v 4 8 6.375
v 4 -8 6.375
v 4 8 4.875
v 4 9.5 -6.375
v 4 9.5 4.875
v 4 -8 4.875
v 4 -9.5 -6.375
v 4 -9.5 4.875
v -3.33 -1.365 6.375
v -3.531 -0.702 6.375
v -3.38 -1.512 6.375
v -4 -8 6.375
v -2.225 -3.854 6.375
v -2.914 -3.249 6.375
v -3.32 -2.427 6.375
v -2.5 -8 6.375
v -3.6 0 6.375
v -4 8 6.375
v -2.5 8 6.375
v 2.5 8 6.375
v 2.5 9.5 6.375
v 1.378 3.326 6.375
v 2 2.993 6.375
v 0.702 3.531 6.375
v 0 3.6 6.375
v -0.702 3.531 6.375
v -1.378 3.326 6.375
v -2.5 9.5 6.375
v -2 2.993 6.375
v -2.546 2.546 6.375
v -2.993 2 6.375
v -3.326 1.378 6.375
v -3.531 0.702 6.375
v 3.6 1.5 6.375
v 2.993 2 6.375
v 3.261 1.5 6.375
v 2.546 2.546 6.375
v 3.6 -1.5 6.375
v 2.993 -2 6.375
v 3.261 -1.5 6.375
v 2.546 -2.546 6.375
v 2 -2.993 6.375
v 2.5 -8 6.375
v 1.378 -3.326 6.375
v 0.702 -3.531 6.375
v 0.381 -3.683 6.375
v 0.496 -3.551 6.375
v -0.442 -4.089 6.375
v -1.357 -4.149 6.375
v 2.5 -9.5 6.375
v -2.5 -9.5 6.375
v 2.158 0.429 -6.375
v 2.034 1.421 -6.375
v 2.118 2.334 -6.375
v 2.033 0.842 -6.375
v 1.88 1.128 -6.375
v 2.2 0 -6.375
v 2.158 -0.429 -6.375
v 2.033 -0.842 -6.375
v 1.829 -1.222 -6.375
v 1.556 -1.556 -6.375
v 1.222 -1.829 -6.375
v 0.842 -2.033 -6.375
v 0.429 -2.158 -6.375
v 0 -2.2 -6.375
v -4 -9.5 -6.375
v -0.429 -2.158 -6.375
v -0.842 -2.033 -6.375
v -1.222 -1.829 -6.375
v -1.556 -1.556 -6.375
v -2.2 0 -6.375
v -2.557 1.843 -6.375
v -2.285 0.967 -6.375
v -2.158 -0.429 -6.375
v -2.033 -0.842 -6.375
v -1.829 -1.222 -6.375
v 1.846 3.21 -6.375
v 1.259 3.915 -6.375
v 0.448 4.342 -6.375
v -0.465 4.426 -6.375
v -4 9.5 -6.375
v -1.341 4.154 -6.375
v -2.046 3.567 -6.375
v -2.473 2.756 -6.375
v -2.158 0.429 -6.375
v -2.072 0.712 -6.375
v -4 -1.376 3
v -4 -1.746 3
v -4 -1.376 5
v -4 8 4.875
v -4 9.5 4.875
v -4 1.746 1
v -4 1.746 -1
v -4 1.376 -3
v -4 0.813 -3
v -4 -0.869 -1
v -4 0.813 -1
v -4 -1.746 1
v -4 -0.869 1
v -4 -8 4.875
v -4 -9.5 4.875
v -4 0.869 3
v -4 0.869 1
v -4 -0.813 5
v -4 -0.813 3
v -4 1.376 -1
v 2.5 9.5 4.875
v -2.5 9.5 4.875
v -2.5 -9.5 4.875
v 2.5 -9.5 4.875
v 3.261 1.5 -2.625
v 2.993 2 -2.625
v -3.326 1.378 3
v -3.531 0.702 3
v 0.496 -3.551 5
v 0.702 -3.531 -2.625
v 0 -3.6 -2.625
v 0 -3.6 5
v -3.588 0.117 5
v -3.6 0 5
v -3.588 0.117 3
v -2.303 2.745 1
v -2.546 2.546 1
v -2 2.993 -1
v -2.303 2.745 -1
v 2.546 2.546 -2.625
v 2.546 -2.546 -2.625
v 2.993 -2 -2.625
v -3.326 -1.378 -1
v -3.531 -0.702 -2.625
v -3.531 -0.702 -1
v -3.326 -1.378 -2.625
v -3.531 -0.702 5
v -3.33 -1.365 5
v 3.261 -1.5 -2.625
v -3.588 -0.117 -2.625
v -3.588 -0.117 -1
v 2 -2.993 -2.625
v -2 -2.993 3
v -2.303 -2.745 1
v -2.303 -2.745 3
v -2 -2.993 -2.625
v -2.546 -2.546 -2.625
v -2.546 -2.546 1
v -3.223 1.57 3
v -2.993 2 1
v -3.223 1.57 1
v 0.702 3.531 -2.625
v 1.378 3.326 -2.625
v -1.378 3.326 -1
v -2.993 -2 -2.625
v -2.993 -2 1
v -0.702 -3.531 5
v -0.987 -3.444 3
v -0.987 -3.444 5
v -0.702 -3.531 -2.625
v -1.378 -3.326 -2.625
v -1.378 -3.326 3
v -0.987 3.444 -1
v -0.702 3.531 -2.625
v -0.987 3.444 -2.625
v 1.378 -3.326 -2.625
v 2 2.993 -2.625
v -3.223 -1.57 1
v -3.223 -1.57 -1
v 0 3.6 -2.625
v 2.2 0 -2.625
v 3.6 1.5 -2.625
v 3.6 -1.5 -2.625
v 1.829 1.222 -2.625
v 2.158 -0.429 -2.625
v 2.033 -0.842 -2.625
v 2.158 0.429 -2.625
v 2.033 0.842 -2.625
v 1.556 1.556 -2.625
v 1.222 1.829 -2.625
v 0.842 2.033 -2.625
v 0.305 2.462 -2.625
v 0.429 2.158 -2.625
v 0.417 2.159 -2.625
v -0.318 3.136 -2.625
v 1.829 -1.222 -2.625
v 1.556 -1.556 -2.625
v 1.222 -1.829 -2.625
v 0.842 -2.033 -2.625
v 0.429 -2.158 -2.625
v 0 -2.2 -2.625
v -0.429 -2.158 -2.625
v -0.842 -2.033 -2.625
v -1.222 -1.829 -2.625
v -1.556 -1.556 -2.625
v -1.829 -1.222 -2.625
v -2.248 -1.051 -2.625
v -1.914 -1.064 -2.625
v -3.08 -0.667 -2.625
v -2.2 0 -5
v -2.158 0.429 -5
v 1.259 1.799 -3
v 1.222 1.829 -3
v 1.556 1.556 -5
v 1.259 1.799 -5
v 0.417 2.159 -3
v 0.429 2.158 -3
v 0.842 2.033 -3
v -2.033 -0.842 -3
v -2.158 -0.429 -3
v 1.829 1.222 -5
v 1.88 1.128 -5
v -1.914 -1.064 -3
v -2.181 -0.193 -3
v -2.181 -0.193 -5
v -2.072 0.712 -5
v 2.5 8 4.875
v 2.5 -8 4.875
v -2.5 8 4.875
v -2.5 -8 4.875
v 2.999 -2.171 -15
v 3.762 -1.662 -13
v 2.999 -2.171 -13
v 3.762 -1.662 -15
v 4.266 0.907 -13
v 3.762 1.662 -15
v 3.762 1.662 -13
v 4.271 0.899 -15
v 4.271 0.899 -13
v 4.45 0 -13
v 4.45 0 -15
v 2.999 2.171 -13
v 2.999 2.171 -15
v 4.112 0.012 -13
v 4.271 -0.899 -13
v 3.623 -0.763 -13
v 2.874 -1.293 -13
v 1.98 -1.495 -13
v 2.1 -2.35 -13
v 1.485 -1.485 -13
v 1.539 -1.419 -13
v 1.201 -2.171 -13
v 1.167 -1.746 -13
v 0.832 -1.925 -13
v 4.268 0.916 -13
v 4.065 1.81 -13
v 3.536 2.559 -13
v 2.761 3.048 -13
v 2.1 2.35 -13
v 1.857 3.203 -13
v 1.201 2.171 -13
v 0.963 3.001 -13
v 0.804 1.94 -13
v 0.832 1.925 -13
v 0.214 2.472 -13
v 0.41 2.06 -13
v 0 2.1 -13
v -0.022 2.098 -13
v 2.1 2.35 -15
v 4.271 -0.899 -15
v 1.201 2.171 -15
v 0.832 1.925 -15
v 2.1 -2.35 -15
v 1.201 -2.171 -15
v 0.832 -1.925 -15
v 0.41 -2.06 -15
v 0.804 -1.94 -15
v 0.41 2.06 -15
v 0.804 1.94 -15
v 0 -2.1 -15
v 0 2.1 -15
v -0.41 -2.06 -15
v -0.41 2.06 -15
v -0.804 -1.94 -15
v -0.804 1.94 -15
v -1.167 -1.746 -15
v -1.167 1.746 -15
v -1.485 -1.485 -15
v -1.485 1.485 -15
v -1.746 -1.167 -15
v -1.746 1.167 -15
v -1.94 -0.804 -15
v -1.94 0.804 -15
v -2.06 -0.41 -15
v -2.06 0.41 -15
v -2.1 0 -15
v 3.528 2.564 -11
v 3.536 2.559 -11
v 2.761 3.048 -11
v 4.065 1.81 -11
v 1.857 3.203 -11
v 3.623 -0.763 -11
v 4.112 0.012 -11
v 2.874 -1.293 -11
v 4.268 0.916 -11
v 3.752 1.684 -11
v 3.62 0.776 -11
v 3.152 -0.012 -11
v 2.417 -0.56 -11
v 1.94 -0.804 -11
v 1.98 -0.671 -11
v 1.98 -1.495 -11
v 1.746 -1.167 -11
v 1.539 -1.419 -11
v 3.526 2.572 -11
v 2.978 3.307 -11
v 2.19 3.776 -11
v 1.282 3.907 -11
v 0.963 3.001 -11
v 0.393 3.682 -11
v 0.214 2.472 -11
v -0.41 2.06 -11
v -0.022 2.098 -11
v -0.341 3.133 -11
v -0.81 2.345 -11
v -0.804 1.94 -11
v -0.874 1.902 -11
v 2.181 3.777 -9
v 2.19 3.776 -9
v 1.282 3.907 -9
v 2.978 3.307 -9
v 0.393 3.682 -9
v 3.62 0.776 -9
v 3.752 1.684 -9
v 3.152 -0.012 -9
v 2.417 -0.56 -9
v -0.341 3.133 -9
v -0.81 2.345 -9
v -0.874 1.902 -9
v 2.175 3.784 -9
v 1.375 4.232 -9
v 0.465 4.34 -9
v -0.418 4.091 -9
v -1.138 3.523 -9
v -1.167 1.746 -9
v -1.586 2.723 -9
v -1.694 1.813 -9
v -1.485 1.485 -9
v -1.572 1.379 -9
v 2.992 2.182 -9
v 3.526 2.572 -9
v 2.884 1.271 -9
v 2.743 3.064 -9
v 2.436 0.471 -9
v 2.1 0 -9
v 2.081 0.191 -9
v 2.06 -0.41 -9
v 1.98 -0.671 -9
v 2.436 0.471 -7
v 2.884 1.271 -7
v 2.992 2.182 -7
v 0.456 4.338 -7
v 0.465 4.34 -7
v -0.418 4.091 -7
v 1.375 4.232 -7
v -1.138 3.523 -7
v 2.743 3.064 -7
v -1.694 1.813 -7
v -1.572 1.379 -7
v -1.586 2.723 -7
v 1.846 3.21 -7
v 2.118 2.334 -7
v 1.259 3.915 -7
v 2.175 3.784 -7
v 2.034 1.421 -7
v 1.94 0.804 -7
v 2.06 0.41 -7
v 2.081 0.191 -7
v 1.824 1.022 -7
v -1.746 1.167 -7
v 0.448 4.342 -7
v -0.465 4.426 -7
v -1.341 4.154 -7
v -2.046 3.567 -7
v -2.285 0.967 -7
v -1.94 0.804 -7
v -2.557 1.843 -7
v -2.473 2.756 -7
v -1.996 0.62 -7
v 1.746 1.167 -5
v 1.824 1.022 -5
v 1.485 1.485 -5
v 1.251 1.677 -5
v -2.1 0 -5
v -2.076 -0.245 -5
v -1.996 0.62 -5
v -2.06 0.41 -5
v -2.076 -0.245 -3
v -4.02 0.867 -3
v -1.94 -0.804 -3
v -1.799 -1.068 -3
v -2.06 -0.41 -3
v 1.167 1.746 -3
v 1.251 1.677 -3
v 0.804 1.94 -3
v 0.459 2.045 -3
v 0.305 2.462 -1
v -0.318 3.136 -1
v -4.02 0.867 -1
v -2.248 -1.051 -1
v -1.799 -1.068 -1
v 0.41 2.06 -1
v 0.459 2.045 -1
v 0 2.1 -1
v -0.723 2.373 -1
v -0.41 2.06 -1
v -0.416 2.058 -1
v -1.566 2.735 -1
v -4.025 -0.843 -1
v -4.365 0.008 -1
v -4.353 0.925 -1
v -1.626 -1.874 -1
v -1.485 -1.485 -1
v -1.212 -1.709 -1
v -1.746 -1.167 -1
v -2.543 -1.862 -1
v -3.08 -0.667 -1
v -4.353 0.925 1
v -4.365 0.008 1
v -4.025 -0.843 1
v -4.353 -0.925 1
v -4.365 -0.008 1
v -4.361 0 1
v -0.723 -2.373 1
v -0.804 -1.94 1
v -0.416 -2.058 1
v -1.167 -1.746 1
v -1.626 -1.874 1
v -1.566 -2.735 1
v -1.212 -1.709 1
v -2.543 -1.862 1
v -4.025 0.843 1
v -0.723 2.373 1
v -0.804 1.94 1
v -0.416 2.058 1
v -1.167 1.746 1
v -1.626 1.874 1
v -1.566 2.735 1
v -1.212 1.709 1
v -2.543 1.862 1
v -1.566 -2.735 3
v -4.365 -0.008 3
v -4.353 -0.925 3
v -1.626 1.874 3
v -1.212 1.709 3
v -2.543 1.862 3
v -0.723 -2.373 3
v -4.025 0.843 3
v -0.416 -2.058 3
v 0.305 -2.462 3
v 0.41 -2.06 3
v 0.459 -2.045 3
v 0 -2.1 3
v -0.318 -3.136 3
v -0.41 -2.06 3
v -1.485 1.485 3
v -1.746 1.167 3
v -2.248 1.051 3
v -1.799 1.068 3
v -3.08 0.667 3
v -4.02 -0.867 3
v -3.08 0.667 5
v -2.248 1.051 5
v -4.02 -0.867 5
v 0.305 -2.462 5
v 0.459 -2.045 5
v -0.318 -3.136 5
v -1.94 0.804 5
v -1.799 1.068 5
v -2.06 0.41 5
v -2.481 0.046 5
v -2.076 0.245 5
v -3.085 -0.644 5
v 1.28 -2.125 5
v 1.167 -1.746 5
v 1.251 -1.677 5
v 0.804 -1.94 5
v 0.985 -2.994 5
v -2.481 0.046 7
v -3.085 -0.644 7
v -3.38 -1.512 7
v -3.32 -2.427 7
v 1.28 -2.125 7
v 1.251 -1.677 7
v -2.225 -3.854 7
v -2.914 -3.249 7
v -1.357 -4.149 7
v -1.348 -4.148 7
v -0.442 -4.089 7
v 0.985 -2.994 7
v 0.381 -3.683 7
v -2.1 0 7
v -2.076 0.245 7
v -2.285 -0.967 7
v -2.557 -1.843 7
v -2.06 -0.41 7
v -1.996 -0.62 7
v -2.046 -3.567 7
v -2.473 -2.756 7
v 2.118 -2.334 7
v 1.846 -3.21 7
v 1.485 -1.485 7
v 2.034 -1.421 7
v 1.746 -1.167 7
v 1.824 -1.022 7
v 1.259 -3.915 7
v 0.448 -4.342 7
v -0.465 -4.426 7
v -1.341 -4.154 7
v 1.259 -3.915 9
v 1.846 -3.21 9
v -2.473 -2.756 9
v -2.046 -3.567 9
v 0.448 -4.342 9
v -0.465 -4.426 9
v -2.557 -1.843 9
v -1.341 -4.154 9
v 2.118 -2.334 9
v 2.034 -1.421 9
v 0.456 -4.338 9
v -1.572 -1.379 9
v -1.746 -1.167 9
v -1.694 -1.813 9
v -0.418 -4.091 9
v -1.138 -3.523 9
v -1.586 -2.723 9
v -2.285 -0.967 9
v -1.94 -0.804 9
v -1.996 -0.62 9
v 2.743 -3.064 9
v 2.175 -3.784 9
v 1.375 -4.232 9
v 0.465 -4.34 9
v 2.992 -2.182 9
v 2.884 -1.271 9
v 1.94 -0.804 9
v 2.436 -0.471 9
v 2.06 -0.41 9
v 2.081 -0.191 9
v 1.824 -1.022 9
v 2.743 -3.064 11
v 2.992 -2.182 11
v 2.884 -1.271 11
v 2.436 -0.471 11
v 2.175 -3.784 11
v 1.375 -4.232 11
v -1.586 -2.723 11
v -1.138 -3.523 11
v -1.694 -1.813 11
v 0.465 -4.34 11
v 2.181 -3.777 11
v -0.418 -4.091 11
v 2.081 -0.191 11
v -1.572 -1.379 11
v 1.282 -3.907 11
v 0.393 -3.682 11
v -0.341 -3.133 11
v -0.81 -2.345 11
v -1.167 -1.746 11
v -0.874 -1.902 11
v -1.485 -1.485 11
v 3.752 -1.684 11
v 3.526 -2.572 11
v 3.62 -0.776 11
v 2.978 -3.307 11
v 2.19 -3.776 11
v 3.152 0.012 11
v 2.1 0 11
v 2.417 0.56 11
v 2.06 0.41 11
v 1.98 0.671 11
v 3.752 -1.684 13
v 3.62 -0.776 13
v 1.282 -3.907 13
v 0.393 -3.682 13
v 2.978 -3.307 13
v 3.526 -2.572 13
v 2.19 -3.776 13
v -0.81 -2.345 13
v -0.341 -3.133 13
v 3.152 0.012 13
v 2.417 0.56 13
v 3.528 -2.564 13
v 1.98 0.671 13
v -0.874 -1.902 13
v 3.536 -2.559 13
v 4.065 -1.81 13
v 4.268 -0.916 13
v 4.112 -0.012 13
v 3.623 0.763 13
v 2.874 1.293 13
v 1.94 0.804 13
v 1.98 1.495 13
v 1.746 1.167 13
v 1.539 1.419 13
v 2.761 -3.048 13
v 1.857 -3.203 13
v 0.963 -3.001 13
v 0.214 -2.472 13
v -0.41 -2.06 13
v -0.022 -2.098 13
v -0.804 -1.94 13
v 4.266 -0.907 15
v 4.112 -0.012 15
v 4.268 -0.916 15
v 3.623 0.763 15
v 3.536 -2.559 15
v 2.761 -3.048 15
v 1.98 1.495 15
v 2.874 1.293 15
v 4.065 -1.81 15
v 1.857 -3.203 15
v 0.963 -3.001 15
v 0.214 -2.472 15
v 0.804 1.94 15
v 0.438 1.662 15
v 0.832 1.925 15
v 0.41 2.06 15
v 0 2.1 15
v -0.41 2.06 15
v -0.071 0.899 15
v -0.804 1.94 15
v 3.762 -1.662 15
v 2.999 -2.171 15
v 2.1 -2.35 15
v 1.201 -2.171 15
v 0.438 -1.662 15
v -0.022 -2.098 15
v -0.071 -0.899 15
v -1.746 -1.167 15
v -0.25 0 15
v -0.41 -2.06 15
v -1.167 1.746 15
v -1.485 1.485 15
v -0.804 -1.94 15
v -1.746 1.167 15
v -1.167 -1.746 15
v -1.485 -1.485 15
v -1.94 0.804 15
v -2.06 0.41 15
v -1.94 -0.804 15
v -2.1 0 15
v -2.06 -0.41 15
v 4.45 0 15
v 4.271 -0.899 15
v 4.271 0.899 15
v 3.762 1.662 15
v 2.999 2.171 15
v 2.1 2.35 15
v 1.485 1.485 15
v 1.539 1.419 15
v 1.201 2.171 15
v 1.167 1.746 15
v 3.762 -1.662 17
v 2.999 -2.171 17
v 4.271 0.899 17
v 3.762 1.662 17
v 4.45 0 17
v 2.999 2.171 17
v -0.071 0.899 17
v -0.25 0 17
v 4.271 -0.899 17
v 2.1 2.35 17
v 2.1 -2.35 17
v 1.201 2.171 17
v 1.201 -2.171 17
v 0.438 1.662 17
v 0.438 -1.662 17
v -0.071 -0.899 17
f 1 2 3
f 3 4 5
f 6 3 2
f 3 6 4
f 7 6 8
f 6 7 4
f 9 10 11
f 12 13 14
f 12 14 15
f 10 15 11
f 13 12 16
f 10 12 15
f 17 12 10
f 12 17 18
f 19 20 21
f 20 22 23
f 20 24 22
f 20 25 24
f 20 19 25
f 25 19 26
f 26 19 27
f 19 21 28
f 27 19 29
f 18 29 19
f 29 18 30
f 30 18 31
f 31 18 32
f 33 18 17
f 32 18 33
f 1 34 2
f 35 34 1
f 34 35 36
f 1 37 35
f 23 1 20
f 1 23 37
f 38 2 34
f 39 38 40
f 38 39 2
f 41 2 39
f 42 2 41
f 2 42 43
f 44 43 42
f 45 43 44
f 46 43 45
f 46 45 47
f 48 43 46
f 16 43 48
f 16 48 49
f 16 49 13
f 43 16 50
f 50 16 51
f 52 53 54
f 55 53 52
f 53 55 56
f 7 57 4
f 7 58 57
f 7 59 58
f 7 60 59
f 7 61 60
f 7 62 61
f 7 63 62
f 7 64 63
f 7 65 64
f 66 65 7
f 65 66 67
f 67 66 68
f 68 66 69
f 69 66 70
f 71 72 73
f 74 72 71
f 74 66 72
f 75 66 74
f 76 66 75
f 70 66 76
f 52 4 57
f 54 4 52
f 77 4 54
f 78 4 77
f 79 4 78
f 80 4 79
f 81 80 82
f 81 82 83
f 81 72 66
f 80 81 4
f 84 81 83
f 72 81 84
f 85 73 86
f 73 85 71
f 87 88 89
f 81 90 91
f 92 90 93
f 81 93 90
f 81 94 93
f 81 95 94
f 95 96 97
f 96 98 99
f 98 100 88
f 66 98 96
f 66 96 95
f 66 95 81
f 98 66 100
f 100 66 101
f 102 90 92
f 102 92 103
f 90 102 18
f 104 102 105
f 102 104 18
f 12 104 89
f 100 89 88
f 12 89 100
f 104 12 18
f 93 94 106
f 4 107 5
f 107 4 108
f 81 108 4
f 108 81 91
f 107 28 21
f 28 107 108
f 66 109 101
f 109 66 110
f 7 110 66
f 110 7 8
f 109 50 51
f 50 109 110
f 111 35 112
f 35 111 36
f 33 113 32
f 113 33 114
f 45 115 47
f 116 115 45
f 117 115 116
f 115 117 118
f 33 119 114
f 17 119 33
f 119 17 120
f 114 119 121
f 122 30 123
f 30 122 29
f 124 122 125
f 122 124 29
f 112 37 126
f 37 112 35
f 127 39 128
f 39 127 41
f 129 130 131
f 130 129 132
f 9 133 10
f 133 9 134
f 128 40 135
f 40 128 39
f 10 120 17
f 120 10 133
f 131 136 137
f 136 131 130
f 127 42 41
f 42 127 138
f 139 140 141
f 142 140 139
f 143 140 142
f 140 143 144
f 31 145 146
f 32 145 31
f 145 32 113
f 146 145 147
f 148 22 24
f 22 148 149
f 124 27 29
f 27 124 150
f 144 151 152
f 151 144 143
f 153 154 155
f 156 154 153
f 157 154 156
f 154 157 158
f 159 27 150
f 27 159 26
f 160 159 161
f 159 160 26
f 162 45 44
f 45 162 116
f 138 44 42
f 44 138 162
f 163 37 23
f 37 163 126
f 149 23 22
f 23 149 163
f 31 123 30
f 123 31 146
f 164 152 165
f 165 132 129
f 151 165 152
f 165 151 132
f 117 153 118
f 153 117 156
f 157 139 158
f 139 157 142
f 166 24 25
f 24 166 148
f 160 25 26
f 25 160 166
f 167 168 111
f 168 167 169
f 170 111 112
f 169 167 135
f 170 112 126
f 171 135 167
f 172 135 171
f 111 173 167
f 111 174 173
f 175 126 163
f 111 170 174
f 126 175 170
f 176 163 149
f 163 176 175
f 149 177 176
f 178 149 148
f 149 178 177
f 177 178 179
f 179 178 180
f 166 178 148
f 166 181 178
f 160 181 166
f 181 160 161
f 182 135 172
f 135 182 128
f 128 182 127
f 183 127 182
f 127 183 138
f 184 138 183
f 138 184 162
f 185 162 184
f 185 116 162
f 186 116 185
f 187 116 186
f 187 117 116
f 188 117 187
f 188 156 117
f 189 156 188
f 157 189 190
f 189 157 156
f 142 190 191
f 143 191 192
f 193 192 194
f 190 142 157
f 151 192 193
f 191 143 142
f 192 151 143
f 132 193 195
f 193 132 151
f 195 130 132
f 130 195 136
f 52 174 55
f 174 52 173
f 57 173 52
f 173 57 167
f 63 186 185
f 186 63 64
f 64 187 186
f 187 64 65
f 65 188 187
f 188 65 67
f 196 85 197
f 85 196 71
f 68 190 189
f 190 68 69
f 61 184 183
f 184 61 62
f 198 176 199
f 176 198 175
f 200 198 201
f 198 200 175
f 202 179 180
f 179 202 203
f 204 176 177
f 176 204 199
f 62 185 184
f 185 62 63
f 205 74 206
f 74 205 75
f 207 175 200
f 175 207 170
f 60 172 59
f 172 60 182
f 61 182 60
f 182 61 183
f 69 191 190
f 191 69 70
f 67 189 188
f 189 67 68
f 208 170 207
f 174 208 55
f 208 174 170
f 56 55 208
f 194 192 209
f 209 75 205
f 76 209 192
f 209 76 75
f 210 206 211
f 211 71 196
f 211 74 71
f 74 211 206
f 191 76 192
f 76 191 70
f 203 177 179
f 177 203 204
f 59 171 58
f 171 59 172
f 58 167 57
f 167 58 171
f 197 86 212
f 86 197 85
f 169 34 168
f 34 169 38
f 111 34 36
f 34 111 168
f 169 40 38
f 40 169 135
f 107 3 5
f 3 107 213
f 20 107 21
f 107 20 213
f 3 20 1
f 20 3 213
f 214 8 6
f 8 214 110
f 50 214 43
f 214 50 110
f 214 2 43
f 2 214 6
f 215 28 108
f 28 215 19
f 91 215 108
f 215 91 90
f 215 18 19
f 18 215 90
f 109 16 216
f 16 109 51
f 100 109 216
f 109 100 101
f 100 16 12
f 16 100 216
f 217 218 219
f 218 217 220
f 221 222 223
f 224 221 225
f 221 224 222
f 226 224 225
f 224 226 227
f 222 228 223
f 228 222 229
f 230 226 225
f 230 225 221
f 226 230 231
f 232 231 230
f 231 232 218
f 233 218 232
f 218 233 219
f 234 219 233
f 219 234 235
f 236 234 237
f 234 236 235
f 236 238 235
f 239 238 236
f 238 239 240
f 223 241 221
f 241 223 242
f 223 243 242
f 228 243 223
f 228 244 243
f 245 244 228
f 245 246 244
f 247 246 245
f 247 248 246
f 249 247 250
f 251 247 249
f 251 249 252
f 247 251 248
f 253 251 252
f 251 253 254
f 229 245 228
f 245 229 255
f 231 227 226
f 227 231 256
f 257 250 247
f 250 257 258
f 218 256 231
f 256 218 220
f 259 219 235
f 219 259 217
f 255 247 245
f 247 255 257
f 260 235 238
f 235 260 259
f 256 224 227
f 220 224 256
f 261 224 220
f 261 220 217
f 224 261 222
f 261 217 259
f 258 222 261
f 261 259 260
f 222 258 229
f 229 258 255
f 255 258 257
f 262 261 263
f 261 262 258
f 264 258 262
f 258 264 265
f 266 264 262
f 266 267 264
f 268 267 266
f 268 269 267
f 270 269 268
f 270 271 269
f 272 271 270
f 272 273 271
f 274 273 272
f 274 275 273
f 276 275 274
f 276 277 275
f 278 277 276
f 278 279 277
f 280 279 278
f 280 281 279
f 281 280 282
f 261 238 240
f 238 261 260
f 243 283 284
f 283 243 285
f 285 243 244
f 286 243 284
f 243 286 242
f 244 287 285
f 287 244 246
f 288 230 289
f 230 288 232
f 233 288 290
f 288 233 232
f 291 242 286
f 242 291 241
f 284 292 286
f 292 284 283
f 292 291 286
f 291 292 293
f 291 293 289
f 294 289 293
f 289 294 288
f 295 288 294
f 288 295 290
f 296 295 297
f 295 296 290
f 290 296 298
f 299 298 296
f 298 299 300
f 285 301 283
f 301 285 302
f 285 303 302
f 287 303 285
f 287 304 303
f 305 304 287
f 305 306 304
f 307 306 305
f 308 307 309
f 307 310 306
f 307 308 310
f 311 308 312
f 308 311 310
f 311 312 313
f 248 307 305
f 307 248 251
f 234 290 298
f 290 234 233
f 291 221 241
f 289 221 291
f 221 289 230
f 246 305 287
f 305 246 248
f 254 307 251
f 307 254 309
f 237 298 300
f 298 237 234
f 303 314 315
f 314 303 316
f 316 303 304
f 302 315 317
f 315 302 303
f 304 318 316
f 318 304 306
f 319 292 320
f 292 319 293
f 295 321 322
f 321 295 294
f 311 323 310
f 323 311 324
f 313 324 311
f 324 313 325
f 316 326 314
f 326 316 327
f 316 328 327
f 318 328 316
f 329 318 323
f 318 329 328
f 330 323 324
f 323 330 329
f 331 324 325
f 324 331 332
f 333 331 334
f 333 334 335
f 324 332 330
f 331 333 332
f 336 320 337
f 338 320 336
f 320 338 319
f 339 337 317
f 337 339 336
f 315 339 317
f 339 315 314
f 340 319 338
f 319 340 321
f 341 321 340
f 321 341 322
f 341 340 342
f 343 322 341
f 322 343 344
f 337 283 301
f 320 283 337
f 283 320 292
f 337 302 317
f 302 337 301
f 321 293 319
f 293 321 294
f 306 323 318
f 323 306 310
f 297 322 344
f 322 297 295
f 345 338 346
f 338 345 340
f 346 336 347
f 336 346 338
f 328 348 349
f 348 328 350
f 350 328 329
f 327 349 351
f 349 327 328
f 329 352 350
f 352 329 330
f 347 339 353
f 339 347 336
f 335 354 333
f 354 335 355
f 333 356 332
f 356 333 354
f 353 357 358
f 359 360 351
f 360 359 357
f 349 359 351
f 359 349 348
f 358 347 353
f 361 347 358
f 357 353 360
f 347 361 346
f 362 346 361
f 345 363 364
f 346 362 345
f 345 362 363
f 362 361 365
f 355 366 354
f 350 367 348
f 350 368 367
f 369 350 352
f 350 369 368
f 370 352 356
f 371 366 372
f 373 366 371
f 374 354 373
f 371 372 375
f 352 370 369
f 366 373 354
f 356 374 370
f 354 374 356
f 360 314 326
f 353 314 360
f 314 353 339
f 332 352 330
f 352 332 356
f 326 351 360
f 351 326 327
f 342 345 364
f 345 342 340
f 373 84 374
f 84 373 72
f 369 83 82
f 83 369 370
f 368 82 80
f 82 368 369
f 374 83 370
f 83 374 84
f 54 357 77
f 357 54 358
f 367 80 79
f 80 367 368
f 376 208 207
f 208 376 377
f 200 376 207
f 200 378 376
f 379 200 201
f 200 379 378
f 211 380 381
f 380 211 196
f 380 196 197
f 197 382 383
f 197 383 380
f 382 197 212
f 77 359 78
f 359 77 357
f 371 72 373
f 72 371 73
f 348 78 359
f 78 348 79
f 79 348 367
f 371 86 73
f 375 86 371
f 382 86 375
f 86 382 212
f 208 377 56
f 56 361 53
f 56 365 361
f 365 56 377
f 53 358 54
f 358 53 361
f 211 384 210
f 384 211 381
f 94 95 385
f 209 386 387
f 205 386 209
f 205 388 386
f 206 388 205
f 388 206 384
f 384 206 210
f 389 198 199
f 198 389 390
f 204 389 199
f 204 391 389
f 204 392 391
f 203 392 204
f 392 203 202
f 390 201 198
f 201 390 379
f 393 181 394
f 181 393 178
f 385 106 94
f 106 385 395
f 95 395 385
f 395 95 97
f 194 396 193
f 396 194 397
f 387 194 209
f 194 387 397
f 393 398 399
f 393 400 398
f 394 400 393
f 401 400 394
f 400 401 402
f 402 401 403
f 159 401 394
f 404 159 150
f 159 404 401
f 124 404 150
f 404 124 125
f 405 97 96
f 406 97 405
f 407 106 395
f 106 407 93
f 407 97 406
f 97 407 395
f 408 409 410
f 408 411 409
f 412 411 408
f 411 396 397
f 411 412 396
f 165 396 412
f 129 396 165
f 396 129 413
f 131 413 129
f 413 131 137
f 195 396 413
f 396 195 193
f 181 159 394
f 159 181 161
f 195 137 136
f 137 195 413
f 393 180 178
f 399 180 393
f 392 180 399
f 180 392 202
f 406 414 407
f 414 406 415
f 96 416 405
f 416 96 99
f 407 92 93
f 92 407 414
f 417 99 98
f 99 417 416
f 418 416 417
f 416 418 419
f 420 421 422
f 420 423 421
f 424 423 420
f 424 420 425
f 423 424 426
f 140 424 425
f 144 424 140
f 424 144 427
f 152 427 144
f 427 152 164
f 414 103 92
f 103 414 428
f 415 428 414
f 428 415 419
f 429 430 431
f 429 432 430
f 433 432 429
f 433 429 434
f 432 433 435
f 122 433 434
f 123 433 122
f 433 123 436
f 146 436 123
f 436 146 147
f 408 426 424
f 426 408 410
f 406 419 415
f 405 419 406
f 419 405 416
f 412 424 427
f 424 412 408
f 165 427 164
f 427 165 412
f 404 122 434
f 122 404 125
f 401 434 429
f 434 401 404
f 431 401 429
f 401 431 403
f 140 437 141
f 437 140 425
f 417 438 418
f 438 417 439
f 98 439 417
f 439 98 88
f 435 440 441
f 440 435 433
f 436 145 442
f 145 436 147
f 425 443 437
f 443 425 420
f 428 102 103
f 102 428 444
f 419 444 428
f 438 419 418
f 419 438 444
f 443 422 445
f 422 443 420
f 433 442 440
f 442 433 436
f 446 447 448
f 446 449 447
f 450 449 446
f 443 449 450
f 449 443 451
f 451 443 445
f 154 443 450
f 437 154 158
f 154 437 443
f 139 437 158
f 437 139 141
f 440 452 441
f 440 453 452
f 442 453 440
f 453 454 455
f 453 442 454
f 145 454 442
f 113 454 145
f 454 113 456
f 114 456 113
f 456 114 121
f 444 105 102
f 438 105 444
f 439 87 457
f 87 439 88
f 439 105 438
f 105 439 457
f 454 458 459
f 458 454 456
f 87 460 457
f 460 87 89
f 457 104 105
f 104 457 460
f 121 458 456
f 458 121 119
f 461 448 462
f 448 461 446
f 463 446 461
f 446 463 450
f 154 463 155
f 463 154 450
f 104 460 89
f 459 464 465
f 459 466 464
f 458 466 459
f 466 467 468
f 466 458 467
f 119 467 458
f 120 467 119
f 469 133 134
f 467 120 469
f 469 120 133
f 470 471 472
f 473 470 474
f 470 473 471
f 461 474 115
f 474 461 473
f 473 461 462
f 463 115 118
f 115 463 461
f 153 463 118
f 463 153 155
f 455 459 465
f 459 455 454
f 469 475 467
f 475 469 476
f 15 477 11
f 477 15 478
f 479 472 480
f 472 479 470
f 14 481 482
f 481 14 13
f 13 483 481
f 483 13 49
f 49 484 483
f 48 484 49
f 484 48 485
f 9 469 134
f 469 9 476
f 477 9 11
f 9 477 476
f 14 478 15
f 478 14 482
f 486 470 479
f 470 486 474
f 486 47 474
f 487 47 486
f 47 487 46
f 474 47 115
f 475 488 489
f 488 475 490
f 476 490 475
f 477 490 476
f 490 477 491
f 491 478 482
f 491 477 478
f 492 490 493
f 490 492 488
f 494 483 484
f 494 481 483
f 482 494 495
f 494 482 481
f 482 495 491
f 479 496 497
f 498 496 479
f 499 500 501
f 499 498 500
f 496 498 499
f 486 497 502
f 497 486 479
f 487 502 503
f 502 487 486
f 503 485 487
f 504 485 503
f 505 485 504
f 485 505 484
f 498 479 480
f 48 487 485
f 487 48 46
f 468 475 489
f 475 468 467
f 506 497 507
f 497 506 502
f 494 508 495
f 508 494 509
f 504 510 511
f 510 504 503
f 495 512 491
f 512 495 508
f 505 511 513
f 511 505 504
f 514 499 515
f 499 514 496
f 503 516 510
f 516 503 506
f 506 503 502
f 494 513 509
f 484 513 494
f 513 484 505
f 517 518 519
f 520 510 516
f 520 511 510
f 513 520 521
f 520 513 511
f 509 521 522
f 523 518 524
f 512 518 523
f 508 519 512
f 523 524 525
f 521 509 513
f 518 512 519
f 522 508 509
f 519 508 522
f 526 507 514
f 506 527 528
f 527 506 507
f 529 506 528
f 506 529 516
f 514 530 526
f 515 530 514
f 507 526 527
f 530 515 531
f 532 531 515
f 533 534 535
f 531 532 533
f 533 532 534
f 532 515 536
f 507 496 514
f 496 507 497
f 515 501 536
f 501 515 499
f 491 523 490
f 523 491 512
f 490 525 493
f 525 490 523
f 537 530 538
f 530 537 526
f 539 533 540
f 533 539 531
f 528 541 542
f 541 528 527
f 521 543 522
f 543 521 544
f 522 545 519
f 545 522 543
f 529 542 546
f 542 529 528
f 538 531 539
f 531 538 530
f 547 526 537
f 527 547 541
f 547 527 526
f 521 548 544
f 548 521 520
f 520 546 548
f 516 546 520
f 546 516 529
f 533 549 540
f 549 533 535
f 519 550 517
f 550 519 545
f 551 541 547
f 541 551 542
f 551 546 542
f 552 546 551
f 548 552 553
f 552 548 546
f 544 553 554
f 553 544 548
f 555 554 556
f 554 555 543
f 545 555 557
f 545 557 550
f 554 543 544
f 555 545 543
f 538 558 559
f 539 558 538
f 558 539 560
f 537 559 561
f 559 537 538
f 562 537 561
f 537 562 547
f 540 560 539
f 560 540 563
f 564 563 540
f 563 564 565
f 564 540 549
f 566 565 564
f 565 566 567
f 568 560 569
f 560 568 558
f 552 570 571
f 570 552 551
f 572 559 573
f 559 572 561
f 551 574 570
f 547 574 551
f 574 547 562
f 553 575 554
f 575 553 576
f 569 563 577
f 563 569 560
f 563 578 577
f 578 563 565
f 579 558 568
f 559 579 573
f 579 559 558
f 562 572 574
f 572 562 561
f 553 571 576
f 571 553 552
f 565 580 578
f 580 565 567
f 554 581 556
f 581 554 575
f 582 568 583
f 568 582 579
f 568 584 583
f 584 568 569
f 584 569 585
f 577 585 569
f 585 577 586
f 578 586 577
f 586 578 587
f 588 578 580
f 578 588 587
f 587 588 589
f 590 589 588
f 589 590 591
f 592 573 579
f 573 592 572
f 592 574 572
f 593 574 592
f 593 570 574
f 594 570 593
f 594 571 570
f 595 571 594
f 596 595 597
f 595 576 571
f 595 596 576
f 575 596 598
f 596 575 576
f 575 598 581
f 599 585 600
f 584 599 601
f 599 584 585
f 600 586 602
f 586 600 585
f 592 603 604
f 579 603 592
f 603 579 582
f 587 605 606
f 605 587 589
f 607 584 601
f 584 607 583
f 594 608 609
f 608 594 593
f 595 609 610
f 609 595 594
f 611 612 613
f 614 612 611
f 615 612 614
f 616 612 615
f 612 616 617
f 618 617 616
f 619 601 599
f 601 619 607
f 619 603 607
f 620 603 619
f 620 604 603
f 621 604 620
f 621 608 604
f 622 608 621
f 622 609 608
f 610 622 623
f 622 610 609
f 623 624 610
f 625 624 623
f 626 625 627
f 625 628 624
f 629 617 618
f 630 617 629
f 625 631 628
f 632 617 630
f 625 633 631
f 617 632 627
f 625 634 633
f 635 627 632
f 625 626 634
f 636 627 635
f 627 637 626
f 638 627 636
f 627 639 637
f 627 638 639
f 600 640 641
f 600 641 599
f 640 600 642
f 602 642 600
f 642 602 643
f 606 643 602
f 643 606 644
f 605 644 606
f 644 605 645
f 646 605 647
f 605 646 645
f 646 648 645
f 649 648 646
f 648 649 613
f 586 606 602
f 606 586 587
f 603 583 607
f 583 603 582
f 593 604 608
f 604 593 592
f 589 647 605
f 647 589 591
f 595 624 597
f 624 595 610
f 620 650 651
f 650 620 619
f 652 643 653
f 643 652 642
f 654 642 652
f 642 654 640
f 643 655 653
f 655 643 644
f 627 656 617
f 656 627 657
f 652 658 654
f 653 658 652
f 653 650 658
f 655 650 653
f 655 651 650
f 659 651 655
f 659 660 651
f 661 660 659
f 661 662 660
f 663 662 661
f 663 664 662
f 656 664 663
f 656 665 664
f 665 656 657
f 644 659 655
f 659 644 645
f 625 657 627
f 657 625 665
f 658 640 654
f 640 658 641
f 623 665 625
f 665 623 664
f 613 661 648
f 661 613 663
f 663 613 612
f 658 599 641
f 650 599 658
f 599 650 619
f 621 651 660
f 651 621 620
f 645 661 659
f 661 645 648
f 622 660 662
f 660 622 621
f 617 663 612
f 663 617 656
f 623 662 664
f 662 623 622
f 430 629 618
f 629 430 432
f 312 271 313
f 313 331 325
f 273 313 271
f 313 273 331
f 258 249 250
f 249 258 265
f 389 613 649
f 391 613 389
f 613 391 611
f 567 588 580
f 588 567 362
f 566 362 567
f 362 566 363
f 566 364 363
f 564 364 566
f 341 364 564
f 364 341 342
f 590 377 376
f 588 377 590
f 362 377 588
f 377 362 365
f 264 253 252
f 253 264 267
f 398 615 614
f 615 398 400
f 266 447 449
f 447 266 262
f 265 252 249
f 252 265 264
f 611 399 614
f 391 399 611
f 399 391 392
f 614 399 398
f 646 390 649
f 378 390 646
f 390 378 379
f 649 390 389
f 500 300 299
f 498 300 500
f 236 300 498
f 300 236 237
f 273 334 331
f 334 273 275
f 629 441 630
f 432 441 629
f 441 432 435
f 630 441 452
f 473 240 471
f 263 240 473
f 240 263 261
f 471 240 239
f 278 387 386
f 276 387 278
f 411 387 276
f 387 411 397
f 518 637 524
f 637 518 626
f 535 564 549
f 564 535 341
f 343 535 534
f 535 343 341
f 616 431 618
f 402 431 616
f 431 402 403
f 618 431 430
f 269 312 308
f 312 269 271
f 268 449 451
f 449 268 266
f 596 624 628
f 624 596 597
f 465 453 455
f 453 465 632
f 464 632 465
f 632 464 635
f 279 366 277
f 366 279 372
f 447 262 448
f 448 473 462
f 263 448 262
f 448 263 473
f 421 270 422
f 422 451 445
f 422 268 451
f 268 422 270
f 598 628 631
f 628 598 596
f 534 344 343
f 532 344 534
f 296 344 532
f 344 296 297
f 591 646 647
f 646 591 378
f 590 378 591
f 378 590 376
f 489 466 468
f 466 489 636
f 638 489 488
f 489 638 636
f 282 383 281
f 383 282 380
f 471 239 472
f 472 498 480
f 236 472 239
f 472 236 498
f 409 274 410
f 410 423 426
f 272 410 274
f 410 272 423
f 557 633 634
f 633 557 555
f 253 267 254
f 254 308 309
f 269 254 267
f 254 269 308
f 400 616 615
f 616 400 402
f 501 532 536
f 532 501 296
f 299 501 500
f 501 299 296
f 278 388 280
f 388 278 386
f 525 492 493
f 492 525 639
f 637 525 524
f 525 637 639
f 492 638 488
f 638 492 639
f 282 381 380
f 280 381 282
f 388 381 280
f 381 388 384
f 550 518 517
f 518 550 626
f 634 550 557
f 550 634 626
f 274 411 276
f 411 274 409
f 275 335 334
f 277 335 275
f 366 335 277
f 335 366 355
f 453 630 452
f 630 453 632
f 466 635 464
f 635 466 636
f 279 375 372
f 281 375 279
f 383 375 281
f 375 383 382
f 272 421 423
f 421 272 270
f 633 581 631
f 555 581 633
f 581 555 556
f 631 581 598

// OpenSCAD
// Parameters
block_width = 8.0; //[4.0:16.0:0.25]
block_height = 12.75; //[6.0:25.5:0.25]
block_length = 19.0; //[9.5:38.0:0.25]
tolerance_clearance = 0.2; //[0.0:0.6:0.05]
nut_capture_diameter = 7.0; //[4.0:12.0:0.1]
nut_capture_depth = 8.0; //[3.0:18.0:0.25]
leadscrew_clearance_diameter = 4.2; //[2.0:10.0:0.1]
mount_hole_count = 0; //[0:4:1]
mount_hole_diameter = 3.2; //[1.5:6.0:0.1]
mount_hole_spacing = 12.0; //[6.0:24.0:0.25]
counterbore_diameter = 6.0; //[3.5:10.0:0.1]
counterbore_depth = 2.0; //[0.5:6.0:0.1]
chamfer_size = 0.5; //[0.0:2.0:0.1]
anti_rotation_flat_depth = 0.8; //[0.0:2.5:0.1]
anti_rotation_flat_width = 3.0; //[1.0:6.0:0.1]
overlap = 1.0; //[0.5:2.0:0.1]
leadscrew_length = 30.0; //[10.0:80.0:1]

// Leadscrew - detailed geometry
module leadscrew() {
  color("Silver") {
    // Leadscrew body
    cylinder(d=leadscrew_clearance_diameter, h=leadscrew_length, center=true, $fn=32);
    // Thread representation (simplified)
    translate([0, 0, -leadscrew_length/2])
      for (i = [0:leadscrew_length/2]) {
        rotate([0, 0, i * 360 / (leadscrew_length/2)])
          translate([leadscrew_clearance_diameter/2, 0, i * 2])
          cylinder(d=leadscrew_clearance_diameter + 0.5, h=2, $fn=16);
      }
  }
}

// Main block with features
module housing_block_with_features() {
  difference() {
    // Main block
    cube([block_width, block_length, block_height], center=true);
    
    // Nut capture pocket
    translate([0, 0, block_height/2 - (nut_capture_depth + overlap)/2])
      cylinder(r=(nut_capture_diameter + tolerance_clearance)/2, h=nut_capture_depth + overlap, center=true, $fn=32);
    
    // Leadscrew through bore
    translate([0, 0, 0])
      cylinder(r=(leadscrew_clearance_diameter + tolerance_clearance)/2, h=block_height + 2*overlap, center=true, $fn=32);
    
    // Anti-rotation flat cut
    translate([(nut_capture_diameter + tolerance_clearance)/2 - (anti_rotation_flat_depth + overlap)/2, 0, block_height/2 - nut_capture_depth/2])
      cube([anti_rotation_flat_depth + overlap, anti_rotation_flat_width, nut_capture_depth + 2*overlap], center=true);
    
    // Mounting holes and counterbores
    if (mount_hole_count >= 2) {
      translate([0, mount_hole_spacing/2, 0])
        cylinder(r=(mount_hole_diameter + tolerance_clearance)/2, h=block_height + 2*overlap, center=true, $fn=32);
      translate([0, -mount_hole_spacing/2, 0])
        cylinder(r=(mount_hole_diameter + tolerance_clearance)/2, h=block_height + 2*overlap, center=true, $fn=32);
      
      translate([0, mount_hole_spacing/2, block_height/2 - (counterbore_depth + overlap)/2])
        cylinder(r=(counterbore_diameter + tolerance_clearance)/2, h=counterbore_depth + overlap, center=true, $fn=32);
      translate([0, -mount_hole_spacing/2, block_height/2 - (counterbore_depth + overlap)/2])
        cylinder(r=(counterbore_diameter + tolerance_clearance)/2, h=counterbore_depth + overlap, center=true, $fn=32);
    }
    
    // Lead-in chamfers
    translate([block_width/2 - (chamfer_size + overlap)/2, block_length/2 - (chamfer_size + overlap)/2, block_height/2 - (chamfer_size + overlap)/2])
      cube([chamfer_size + overlap, chamfer_size + overlap, chamfer_size + overlap], center=true);
    translate([block_width/2 - (chamfer_size + overlap)/2, -block_length/2 + (chamfer_size + overlap)/2, block_height/2 - (chamfer_size + overlap)/2])
      cube([chamfer_size + overlap, chamfer_size + overlap, chamfer_size + overlap], center=true);
    translate([-block_width/2 + (chamfer_size + overlap)/2, block_length/2 - (chamfer_size + overlap)/2, block_height/2 - (chamfer_size + overlap)/2])
      cube([chamfer_size + overlap, chamfer_size + overlap, chamfer_size + overlap], center=true);
    translate([-block_width/2 + (chamfer_size + overlap)/2, -block_length/2 + (chamfer_size + overlap)/2, block_height/2 - (chamfer_size + overlap)/2])
      cube([chamfer_size + overlap, chamfer_size + overlap, chamfer_size + overlap], center=true);
  }
}

// Assembly
module assembly() {
  union() {
    housing_block_with_features();
    leadscrew();
  }
}

assembly();
